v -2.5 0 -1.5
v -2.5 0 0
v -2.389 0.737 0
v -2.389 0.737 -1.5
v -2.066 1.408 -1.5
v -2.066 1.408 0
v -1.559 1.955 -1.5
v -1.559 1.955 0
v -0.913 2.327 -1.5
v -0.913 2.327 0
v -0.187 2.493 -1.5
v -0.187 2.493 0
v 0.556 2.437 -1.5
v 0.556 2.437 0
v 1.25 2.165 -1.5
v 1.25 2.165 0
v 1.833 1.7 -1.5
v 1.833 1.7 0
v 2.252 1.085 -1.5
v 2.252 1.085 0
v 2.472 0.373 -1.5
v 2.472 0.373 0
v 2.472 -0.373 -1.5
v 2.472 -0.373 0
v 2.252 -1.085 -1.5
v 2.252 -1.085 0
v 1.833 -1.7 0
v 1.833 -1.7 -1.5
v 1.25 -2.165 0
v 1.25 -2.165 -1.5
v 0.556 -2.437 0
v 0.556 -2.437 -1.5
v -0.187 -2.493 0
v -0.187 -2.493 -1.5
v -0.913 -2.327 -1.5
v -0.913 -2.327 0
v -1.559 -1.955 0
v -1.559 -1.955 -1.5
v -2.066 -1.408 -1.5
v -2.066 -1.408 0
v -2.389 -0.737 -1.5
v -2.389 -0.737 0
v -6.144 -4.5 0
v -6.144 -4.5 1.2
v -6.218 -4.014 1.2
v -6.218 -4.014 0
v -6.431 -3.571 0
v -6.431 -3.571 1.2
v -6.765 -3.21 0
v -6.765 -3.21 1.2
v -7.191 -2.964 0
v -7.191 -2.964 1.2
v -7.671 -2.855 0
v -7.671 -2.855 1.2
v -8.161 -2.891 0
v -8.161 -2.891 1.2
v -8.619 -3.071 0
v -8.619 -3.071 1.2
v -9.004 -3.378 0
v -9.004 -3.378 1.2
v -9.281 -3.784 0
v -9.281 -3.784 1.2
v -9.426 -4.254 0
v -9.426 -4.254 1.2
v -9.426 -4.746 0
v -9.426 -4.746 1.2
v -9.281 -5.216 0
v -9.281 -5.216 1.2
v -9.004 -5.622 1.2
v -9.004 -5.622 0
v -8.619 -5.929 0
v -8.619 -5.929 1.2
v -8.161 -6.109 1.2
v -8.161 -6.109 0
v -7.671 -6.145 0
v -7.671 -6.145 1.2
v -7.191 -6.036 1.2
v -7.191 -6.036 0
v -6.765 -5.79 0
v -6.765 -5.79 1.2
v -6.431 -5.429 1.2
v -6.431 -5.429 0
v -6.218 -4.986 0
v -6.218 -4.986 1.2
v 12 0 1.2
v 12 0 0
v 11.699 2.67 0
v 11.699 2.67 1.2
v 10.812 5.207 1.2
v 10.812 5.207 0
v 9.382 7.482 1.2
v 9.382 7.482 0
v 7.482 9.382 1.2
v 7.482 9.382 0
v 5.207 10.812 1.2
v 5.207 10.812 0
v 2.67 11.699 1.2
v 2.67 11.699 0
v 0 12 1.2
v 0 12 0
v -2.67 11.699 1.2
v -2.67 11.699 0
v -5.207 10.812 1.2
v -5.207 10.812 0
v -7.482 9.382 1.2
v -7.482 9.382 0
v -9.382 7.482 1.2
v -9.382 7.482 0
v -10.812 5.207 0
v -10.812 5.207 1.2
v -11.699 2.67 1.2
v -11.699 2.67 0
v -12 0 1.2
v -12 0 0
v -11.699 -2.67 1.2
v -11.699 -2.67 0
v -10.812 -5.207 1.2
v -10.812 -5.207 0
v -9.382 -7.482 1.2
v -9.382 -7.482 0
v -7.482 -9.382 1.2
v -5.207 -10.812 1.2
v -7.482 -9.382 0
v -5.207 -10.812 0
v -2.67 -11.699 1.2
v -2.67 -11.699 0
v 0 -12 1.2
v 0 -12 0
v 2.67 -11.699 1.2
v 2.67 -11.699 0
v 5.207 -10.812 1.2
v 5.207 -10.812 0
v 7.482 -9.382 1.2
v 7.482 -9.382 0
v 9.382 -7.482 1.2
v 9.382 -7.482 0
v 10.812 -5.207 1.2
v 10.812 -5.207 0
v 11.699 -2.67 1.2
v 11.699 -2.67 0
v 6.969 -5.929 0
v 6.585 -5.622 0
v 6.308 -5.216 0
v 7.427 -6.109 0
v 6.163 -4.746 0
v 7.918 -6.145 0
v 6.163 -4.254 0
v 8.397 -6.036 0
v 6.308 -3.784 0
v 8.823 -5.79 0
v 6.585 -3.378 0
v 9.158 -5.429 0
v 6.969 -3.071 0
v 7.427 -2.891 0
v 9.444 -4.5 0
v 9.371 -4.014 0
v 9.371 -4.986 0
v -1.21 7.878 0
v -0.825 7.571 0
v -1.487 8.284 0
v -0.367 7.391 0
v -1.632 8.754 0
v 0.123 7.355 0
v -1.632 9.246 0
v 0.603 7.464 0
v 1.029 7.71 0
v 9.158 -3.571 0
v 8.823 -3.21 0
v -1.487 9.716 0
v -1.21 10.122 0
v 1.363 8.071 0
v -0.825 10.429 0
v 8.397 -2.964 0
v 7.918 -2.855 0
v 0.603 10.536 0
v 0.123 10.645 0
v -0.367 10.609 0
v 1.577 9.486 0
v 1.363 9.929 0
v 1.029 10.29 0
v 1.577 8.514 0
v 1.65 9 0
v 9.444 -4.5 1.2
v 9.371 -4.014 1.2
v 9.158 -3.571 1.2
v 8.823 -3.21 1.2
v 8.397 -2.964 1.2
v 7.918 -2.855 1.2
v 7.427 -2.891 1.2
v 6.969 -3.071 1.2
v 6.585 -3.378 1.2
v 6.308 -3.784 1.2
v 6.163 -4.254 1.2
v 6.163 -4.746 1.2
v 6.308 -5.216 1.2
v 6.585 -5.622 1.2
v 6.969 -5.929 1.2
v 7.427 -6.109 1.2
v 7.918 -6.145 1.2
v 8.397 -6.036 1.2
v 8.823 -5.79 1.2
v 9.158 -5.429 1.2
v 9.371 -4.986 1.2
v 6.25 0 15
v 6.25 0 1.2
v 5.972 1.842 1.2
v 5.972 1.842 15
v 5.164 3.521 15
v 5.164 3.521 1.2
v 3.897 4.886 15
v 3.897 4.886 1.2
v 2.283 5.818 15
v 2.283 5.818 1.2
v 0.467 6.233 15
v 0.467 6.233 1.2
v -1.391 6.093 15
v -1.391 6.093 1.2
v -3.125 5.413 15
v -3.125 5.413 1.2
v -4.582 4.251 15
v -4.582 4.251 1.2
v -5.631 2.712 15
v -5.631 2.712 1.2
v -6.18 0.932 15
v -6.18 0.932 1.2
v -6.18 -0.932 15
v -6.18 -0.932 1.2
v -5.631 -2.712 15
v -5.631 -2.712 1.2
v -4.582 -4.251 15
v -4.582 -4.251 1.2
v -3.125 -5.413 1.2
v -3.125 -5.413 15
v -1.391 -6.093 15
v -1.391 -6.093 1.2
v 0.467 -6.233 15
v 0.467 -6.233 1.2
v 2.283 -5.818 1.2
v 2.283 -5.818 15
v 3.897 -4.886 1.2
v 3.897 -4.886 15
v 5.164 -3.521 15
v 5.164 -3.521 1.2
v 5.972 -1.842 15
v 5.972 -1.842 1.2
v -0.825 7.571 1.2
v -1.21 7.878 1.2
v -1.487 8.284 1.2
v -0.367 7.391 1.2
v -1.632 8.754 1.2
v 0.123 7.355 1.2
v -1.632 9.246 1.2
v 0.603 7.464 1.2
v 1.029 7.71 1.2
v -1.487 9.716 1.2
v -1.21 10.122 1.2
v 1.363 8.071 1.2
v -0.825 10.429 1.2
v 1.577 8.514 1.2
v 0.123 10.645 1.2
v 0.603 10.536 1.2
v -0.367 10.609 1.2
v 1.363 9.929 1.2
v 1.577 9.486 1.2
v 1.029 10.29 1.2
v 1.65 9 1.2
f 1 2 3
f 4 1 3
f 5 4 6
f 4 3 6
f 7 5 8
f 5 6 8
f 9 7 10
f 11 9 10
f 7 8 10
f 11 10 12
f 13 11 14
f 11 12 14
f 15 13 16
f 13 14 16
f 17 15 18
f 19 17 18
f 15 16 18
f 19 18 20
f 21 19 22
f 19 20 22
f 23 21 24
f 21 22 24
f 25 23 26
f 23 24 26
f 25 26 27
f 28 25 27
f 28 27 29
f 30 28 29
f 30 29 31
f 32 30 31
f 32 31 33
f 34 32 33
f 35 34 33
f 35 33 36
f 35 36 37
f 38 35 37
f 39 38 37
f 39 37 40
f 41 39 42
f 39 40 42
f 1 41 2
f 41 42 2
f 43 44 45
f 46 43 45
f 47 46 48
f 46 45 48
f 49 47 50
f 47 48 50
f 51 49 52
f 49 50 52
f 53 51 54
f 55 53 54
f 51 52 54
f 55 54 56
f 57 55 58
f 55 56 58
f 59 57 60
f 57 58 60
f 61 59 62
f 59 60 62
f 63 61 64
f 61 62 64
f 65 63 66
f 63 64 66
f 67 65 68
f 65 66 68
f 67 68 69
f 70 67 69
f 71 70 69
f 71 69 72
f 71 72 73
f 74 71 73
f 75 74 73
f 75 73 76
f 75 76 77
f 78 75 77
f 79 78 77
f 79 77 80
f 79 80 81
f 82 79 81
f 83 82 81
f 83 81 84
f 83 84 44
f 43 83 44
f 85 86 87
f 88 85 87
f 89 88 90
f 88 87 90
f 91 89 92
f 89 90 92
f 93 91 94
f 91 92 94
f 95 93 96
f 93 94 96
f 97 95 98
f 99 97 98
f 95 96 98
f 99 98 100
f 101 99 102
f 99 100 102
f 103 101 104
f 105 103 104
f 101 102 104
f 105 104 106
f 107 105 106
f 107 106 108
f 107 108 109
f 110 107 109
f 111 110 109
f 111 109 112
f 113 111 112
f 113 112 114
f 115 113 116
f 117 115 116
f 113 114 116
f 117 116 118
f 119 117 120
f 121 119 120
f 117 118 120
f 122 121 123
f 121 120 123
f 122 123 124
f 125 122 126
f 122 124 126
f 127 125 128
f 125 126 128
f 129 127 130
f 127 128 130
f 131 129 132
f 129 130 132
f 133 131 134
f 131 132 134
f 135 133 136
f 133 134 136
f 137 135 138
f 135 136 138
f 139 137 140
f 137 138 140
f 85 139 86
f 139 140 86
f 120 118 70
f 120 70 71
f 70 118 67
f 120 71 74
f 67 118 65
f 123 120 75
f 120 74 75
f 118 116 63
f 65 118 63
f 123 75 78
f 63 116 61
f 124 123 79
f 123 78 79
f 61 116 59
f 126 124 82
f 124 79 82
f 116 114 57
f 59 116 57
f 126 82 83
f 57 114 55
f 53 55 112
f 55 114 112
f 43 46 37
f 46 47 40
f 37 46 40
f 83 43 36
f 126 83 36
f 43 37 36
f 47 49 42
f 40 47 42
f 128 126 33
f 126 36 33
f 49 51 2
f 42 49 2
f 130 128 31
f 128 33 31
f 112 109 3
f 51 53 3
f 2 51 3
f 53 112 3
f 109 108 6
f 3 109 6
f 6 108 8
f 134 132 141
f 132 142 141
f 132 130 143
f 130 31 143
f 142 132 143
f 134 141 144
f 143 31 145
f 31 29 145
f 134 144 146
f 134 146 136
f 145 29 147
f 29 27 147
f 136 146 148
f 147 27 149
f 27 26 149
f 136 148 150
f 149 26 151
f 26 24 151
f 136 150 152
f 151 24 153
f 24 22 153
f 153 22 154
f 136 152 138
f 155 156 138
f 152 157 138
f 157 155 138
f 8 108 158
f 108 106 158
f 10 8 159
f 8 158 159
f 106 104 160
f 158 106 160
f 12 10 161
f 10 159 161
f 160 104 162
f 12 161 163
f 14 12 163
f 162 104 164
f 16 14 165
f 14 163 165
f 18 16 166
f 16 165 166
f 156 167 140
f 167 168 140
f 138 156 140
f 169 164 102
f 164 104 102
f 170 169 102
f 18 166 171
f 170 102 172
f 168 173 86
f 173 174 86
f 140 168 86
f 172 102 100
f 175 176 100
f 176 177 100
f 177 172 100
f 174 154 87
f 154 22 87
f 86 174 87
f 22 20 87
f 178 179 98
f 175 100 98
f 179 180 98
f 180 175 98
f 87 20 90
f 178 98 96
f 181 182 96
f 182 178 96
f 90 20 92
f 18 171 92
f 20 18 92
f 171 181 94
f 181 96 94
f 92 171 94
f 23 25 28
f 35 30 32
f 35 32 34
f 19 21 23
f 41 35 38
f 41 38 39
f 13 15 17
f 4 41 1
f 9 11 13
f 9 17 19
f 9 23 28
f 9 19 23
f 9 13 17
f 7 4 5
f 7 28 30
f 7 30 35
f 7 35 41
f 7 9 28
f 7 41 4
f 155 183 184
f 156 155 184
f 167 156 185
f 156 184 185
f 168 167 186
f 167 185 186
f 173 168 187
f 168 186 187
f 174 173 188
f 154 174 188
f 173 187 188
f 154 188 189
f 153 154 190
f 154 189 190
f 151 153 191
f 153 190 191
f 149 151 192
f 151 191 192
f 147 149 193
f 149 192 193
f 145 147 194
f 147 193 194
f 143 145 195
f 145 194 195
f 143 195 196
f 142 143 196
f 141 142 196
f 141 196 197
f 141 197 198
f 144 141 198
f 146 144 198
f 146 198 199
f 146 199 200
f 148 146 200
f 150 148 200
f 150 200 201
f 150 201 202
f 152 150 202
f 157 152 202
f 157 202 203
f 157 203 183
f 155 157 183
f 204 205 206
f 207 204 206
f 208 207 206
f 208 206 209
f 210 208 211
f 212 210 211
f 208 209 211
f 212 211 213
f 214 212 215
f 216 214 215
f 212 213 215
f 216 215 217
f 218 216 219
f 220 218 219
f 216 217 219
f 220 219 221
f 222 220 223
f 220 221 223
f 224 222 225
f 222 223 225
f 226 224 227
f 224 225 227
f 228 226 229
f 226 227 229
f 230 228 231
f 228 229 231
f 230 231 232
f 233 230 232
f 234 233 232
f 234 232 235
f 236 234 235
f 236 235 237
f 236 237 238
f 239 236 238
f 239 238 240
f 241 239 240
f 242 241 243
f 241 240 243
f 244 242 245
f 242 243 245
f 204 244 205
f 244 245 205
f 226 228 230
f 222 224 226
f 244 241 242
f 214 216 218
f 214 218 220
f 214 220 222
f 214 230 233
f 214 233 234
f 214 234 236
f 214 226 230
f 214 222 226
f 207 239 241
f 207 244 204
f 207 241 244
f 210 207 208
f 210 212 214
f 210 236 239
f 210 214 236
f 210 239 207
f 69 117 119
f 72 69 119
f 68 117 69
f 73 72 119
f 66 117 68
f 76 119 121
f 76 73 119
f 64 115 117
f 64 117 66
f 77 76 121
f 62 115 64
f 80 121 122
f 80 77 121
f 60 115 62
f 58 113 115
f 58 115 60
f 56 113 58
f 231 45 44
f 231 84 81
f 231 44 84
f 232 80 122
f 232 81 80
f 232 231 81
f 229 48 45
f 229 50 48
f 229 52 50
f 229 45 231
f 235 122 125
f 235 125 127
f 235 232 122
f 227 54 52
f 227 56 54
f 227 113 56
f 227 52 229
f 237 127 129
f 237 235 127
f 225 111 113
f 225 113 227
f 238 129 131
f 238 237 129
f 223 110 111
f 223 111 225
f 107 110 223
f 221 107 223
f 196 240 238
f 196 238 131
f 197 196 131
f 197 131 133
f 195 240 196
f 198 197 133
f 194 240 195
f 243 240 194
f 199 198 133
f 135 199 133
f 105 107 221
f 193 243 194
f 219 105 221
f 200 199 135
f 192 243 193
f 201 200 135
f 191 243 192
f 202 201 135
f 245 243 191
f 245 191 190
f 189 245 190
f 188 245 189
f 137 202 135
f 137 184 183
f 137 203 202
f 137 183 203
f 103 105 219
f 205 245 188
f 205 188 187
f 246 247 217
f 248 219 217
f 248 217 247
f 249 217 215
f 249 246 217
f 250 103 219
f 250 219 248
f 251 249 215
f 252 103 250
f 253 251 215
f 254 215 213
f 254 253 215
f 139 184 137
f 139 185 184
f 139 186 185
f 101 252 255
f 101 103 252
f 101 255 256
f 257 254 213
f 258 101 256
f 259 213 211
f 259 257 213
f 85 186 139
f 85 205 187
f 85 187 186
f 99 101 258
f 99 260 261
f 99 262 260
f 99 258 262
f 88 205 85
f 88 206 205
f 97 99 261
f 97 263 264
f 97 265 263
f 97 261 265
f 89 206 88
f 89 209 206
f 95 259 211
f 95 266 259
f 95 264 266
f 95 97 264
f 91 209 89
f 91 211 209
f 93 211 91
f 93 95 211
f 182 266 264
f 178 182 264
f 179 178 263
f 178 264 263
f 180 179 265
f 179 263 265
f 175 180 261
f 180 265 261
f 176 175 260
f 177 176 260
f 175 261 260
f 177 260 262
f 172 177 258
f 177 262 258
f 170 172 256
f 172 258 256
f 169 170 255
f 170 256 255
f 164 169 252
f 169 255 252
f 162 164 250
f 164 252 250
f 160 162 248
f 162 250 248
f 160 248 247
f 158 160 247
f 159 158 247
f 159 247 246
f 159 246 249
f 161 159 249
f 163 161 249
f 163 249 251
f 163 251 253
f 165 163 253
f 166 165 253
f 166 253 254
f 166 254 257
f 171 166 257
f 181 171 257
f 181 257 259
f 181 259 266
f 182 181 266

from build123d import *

# Parameters (mm, degrees)
SKETCH1_R           = 12
BOSS_EXTRUDE1_DEPTH = 1.2
SKETCH2_R           = 6.25
BOSS_EXTRUDE2_DEPTH = 13.8
SKETCH3_R           = 1.65
CUT_EXTRUDE1_DEPTH  = 2.2
SKETCH4_R           = 2.5
BOSS_EXTRUDE3_DEPTH = 1.5


with BuildPart() as part:
    # Sketch1 → Boss-Extrude1 (new body)
    with BuildSketch(Plane.XY):
        Circle(SKETCH1_R)
    extrude(amount=BOSS_EXTRUDE1_DEPTH)

    # Sketch2 → Boss-Extrude2 (add)
    with BuildSketch(Plane.XY.offset(1.2)):
        Circle(SKETCH2_R)
    extrude(amount=BOSS_EXTRUDE2_DEPTH)

    # Sketch3 → Cut-Extrude1 (cut, through all)
    with BuildSketch(Plane.XY.offset(1.2)):
        with Locations((0, 9)):
            Circle(SKETCH3_R)
        with Locations((7.794228634, -4.5)):
            Circle(SKETCH3_R)
        with Locations((-7.794228634, -4.5)):
            Circle(SKETCH3_R)
    extrude(amount=-CUT_EXTRUDE1_DEPTH, mode=Mode.SUBTRACT)

    # Sketch4 → Boss-Extrude3 (add)
    with BuildSketch(Plane(origin=(0, 0, 0), x_dir=(-1, 0, 0), z_dir=(0, 0, -1))):
        Circle(SKETCH4_R)
    extrude(amount=BOSS_EXTRUDE3_DEPTH)


solid = part.part
